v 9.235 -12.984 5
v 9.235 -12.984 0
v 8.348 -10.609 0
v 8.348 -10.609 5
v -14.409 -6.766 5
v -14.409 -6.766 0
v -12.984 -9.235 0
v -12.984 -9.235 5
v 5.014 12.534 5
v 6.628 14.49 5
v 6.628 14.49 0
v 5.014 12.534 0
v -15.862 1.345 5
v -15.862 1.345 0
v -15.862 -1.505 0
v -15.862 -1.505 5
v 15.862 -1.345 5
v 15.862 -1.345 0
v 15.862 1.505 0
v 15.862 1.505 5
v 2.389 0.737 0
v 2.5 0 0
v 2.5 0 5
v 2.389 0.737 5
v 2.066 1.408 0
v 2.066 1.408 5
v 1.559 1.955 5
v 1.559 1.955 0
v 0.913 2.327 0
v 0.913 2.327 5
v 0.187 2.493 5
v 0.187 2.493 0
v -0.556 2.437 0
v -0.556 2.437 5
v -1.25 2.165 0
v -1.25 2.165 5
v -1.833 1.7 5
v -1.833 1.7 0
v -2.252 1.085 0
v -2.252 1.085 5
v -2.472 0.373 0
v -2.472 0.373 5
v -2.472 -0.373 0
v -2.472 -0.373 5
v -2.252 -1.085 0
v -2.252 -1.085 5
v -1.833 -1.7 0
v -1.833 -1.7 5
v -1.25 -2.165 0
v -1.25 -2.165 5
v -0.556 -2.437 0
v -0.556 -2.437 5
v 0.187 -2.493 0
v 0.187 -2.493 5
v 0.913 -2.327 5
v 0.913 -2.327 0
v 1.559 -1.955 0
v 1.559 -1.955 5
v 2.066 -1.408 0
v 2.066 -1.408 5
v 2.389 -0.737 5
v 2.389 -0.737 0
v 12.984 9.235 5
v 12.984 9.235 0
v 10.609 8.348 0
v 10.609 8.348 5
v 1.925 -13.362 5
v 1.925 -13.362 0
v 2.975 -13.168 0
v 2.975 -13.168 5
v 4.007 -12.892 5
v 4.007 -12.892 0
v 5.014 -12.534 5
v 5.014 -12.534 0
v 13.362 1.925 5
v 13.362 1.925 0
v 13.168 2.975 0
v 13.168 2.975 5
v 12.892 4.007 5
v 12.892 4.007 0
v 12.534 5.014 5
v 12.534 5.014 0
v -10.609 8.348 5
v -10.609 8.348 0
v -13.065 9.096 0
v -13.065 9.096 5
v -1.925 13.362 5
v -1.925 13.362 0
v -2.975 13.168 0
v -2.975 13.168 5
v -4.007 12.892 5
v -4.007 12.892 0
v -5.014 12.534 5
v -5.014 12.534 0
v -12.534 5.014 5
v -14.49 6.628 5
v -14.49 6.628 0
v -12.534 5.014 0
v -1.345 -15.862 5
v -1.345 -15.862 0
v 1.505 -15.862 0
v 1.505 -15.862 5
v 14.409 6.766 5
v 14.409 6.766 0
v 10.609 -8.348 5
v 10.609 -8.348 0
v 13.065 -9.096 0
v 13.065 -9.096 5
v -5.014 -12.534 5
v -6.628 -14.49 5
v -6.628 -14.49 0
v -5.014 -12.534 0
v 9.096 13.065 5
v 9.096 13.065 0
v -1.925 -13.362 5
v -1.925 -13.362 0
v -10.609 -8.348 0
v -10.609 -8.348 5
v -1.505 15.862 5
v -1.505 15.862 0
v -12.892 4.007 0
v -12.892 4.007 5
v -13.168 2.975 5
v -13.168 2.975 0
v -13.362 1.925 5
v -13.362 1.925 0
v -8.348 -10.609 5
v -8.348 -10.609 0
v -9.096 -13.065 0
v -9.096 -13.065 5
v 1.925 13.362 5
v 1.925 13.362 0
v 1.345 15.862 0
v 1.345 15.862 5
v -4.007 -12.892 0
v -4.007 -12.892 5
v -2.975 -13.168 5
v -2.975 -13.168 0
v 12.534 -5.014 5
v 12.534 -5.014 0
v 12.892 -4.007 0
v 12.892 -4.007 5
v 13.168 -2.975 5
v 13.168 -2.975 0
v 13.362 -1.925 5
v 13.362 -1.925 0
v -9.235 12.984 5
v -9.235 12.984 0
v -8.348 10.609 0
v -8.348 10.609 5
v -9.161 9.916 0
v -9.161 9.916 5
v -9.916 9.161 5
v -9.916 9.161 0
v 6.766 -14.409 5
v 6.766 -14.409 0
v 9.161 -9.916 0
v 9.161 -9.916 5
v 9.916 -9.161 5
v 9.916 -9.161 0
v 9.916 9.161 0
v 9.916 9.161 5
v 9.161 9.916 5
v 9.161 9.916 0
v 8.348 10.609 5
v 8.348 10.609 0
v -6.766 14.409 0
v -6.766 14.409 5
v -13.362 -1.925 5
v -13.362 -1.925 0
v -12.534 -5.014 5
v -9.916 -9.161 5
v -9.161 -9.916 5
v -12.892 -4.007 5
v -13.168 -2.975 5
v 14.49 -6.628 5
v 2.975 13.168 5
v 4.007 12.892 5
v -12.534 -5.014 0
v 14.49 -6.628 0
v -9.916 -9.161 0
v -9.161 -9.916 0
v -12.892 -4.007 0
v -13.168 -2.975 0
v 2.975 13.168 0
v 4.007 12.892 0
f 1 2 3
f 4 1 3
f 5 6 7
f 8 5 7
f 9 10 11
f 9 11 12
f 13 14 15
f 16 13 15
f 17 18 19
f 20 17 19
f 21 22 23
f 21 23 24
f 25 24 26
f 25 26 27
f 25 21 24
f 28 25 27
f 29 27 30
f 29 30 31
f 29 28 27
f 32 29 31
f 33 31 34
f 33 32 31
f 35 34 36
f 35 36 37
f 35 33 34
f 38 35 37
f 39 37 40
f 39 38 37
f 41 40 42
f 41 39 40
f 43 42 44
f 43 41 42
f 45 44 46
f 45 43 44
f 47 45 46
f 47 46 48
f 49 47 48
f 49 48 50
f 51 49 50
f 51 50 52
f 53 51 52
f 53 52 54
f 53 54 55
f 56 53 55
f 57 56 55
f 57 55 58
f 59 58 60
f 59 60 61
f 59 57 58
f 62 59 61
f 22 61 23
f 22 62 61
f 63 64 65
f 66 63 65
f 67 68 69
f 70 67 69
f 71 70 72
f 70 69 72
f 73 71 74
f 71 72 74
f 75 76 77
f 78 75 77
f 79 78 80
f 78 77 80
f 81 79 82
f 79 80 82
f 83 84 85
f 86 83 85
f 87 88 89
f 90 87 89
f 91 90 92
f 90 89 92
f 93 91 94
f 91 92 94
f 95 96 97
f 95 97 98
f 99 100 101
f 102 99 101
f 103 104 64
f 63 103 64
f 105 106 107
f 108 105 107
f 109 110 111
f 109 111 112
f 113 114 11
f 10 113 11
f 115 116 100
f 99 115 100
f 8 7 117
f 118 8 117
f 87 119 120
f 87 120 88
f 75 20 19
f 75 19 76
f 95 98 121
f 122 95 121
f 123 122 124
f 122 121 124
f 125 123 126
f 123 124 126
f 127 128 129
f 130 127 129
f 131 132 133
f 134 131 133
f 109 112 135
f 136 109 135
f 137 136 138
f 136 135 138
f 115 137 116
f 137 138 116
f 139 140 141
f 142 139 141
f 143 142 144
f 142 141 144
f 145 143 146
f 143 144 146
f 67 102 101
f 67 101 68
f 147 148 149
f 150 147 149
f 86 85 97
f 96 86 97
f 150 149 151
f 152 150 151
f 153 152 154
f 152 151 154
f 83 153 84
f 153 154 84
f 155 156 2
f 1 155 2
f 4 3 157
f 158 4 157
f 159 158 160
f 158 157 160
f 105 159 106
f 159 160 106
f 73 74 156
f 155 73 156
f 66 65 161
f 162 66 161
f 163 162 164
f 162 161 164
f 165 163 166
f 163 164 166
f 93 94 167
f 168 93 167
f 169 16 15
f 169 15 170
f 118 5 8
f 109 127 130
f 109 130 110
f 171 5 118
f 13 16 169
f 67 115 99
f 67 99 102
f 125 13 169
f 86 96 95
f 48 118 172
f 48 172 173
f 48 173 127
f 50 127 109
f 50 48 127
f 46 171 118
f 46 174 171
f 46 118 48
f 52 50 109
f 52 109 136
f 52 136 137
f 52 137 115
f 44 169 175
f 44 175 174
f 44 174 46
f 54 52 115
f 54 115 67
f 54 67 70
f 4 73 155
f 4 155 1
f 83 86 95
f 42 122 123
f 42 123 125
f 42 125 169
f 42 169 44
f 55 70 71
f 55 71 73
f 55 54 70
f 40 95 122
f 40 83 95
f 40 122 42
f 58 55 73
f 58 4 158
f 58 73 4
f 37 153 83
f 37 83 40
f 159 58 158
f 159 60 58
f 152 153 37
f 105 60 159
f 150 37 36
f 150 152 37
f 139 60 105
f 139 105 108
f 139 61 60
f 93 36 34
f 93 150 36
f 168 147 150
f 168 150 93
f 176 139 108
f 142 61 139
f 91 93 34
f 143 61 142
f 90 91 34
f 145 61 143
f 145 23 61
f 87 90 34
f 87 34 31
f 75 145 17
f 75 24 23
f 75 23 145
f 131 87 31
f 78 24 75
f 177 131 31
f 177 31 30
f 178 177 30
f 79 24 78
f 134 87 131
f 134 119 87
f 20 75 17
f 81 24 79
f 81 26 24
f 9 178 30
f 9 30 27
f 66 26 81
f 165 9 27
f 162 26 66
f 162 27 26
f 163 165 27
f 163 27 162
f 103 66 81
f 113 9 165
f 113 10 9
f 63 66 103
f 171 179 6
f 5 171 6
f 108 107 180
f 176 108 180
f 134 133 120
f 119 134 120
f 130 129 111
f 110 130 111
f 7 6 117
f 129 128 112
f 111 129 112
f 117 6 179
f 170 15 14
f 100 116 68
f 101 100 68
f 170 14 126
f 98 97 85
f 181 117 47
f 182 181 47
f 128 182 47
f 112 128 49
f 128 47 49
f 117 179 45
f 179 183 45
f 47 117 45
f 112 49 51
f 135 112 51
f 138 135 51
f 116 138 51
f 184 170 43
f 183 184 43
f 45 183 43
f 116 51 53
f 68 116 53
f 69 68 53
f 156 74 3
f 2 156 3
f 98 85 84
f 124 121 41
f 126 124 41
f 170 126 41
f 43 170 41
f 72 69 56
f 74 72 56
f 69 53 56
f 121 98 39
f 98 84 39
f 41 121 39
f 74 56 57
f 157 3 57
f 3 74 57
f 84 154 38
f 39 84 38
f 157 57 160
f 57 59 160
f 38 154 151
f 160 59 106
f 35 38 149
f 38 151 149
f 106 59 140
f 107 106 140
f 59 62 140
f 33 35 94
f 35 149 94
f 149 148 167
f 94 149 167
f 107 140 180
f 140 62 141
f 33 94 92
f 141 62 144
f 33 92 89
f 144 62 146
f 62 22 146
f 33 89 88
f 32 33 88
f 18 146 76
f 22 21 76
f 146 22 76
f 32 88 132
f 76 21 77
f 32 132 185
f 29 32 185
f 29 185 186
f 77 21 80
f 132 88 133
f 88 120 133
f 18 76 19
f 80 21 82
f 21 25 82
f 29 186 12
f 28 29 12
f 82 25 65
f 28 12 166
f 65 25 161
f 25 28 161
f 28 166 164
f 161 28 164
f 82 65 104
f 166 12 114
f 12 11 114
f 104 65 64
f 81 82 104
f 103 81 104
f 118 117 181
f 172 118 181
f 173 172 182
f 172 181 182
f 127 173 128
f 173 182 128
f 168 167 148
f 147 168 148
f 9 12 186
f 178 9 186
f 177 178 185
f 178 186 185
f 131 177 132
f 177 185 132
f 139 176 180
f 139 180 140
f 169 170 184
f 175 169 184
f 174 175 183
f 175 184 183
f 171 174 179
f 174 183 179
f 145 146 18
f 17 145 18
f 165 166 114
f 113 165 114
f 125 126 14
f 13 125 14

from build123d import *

# Parameters (mm, degrees)
F0_R     = 2.5
F1_DEPTH = 5


with BuildPart() as f1:
    # F0 (on Top) → F1 (new body)
    with BuildSketch(Plane.XY):
        with BuildLine():
            ThreePointArc((-8.348124, 10.609375), (-6.75, 11.691343), (-5.013926, 12.534375))
            Line((-5.013926, 12.534375), (-6.76633, 14.409375))
            Line((-6.76633, 14.409375), (-9.234502, 12.984375))
            Line((-9.234502, 12.984375), (-8.348124, 10.609375))
        make_face()
        with BuildLine():
            Line((13.36205, -1.925), (13.36205, 1.925))
            ThreePointArc((13.36205, 1.925), (13.039999, 3.494057), (12.534375, 5.013926))
            Line((12.534375, 5.013926), (10.609375, 8.348124))
            ThreePointArc((10.609375, 8.348124), (9.545942, 9.545942), (8.348124, 10.609375))
            Line((8.348124, 10.609375), (5.013926, 12.534375))
            ThreePointArc((5.013926, 12.534375), (3.494057, 13.039999), (1.925, 13.36205))
            Line((1.925, 13.36205), (-1.925, 13.36205))
            ThreePointArc((-1.925, 13.36205), (-3.494057, 13.039999), (-5.013926, 12.534375))
            Line((-5.013926, 12.534375), (-8.348124, 10.609375))
            ThreePointArc((-8.348124, 10.609375), (-9.545942, 9.545942), (-10.609375, 8.348124))
            Line((-10.609375, 8.348124), (-12.534375, 5.013926))
            ThreePointArc((-12.534375, 5.013926), (-13.039999, 3.494057), (-13.36205, 1.925))
            Line((-13.36205, 1.925), (-13.36205, -1.925))
            ThreePointArc((-13.36205, -1.925), (-13.039999, -3.494057), (-12.534375, -5.013926))
            Line((-12.534375, -5.013926), (-10.609375, -8.348124))
            ThreePointArc((-10.609375, -8.348124), (-9.545942, -9.545942), (-8.348124, -10.609375))
            Line((-8.348124, -10.609375), (-5.013926, -12.534375))
            ThreePointArc((-5.013926, -12.534375), (-3.494057, -13.039999), (-1.925, -13.36205))
            Line((-1.925, -13.36205), (1.925, -13.36205))
            ThreePointArc((1.925, -13.36205), (3.494057, -13.039999), (5.013926, -12.534375))
            Line((5.013926, -12.534375), (8.348124, -10.609375))
            ThreePointArc((8.348124, -10.609375), (9.545942, -9.545942), (10.609375, -8.348124))
            Line((10.609375, -8.348124), (12.534375, -5.013926))
            ThreePointArc((12.534375, -5.013926), (13.039999, -3.494057), (13.36205, -1.925))
        make_face()
        Circle(F0_R, mode=Mode.SUBTRACT)
        with BuildLine():
            ThreePointArc((-12.534375, 5.013926), (-11.691343, 6.75), (-10.609375, 8.348124))
            Line((-10.609375, 8.348124), (-13.064501, 9.09572))
            Line((-13.064501, 9.09572), (-14.489501, 6.627547))
            Line((-14.489501, 6.627547), (-12.534375, 5.013926))
        make_face()
        with BuildLine():
            ThreePointArc((-13.36205, -1.925), (-13.5, 0), (-13.36205, 1.925))
            Line((-13.36205, 1.925), (-15.86205, 1.344874))
            Line((-15.86205, 1.344874), (-15.86205, -1.505126))
            Line((-15.86205, -1.505126), (-13.36205, -1.925))
        make_face()
        with BuildLine():
            Line((-12.984375, -9.234502), (-10.609375, -8.348124))
            ThreePointArc((-10.609375, -8.348124), (-11.691343, -6.75), (-12.534375, -5.013926))
            Line((-12.534375, -5.013926), (-14.409375, -6.76633))
            Line((-14.409375, -6.76633), (-12.984375, -9.234502))
        make_face()
        with BuildLine():
            Line((-6.627547, -14.489501), (-5.013926, -12.534375))
            ThreePointArc((-5.013926, -12.534375), (-6.75, -11.691343), (-8.348124, -10.609375))
            Line((-8.348124, -10.609375), (-9.09572, -13.064501))
            Line((-9.09572, -13.064501), (-6.627547, -14.489501))
        make_face()
        with BuildLine():
            Line((1.505126, -15.86205), (1.925, -13.36205))
            ThreePointArc((1.925, -13.36205), (0, -13.5), (-1.925, -13.36205))
            Line((-1.925, -13.36205), (-1.344874, -15.86205))
            Line((-1.344874, -15.86205), (1.505126, -15.86205))
        make_face()
        with BuildLine():
            Line((9.234502, -12.984375), (8.348124, -10.609375))
            ThreePointArc((8.348124, -10.609375), (6.75, -11.691343), (5.013926, -12.534375))
            Line((5.013926, -12.534375), (6.76633, -14.409375))
            Line((6.76633, -14.409375), (9.234502, -12.984375))
        make_face()
        with BuildLine():
            Line((14.489501, -6.627547), (12.534375, -5.013926))
            ThreePointArc((12.534375, -5.013926), (11.691343, -6.75), (10.609375, -8.348124))
            Line((10.609375, -8.348124), (13.064501, -9.09572))
            Line((13.064501, -9.09572), (14.489501, -6.627547))
        make_face()
        with BuildLine():
            ThreePointArc((13.36205, 1.925), (13.465468, 0.964968), (13.5, 0))
            ThreePointArc((13.5, 0), (13.465468, -0.964968), (13.36205, -1.925))
            Line((13.36205, -1.925), (15.86205, -1.344874))
            Line((15.86205, -1.344874), (15.86205, 1.505126))
            Line((15.86205, 1.505126), (13.36205, 1.925))
        make_face()
        with BuildLine():
            ThreePointArc((5.013926, 12.534375), (6.75, 11.691343), (8.348124, 10.609375))
            Line((8.348124, 10.609375), (9.09572, 13.064501))
            Line((9.09572, 13.064501), (6.627547, 14.489501))
            Line((6.627547, 14.489501), (5.013926, 12.534375))
        make_face()
        with BuildLine():
            ThreePointArc((-1.925, 13.36205), (0, 13.5), (1.925, 13.36205))
            Line((1.925, 13.36205), (1.344874, 15.86205))
            Line((1.344874, 15.86205), (-1.505126, 15.86205))
            Line((-1.505126, 15.86205), (-1.925, 13.36205))
        make_face()
        with BuildLine():
            ThreePointArc((10.609375, 8.348124), (11.691343, 6.75), (12.534375, 5.013926))
            Line((12.534375, 5.013926), (14.409375, 6.76633))
            Line((14.409375, 6.76633), (12.984375, 9.234502))
            Line((12.984375, 9.234502), (10.609375, 8.348124))
        make_face()
        with BuildLine():
            ThreePointArc((13.36205, -1.925), (13.465468, -0.964968), (13.5, 0))
            ThreePointArc((13.5, 0), (13.465468, 0.964968), (13.36205, 1.925))
            Line((13.36205, 1.925), (13.36205, -1.925))
        make_face()
        with BuildLine():
            Line((10.609375, 8.348124), (12.534375, 5.013926))
            ThreePointArc((12.534375, 5.013926), (11.691343, 6.75), (10.609375, 8.348124))
        make_face()
        with BuildLine():
            Line((5.013926, 12.534375), (8.348124, 10.609375))
            ThreePointArc((8.348124, 10.609375), (6.75, 11.691343), (5.013926, 12.534375))
        make_face()
        with BuildLine():
            Line((-1.925, 13.36205), (1.925, 13.36205))
            ThreePointArc((1.925, 13.36205), (0, 13.5), (-1.925, 13.36205))
        make_face()
        with BuildLine():
            ThreePointArc((-12.534375, -5.013926), (-11.691343, -6.75), (-10.609375, -8.348124))
            Line((-10.609375, -8.348124), (-12.534375, -5.013926))
        make_face()
        with BuildLine():
            ThreePointArc((-8.348124, -10.609375), (-6.75, -11.691343), (-5.013926, -12.534375))
            Line((-5.013926, -12.534375), (-8.348124, -10.609375))
        make_face()
        with BuildLine():
            ThreePointArc((-1.925, -13.36205), (0, -13.5), (1.925, -13.36205))
            Line((1.925, -13.36205), (-1.925, -13.36205))
        make_face()
        with BuildLine():
            ThreePointArc((5.013926, -12.534375), (6.75, -11.691343), (8.348124, -10.609375))
            Line((8.348124, -10.609375), (5.013926, -12.534375))
        make_face()
        with BuildLine():
            ThreePointArc((10.609375, -8.348124), (11.691343, -6.75), (12.534375, -5.013926))
            Line((12.534375, -5.013926), (10.609375, -8.348124))
        make_face()
        with BuildLine():
            Line((-13.36205, -1.925), (-13.36205, 1.925))
            ThreePointArc((-13.36205, 1.925), (-13.5, 0), (-13.36205, -1.925))
        make_face()
        with BuildLine():
            Line((-12.534375, 5.013926), (-10.609375, 8.348124))
            ThreePointArc((-10.609375, 8.348124), (-11.691343, 6.75), (-12.534375, 5.013926))
        make_face()
        with BuildLine():
            Line((-8.348124, 10.609375), (-5.013926, 12.534375))
            ThreePointArc((-5.013926, 12.534375), (-6.75, 11.691343), (-8.348124, 10.609375))
        make_face()
    extrude(amount=F1_DEPTH)


solid = f1.part
